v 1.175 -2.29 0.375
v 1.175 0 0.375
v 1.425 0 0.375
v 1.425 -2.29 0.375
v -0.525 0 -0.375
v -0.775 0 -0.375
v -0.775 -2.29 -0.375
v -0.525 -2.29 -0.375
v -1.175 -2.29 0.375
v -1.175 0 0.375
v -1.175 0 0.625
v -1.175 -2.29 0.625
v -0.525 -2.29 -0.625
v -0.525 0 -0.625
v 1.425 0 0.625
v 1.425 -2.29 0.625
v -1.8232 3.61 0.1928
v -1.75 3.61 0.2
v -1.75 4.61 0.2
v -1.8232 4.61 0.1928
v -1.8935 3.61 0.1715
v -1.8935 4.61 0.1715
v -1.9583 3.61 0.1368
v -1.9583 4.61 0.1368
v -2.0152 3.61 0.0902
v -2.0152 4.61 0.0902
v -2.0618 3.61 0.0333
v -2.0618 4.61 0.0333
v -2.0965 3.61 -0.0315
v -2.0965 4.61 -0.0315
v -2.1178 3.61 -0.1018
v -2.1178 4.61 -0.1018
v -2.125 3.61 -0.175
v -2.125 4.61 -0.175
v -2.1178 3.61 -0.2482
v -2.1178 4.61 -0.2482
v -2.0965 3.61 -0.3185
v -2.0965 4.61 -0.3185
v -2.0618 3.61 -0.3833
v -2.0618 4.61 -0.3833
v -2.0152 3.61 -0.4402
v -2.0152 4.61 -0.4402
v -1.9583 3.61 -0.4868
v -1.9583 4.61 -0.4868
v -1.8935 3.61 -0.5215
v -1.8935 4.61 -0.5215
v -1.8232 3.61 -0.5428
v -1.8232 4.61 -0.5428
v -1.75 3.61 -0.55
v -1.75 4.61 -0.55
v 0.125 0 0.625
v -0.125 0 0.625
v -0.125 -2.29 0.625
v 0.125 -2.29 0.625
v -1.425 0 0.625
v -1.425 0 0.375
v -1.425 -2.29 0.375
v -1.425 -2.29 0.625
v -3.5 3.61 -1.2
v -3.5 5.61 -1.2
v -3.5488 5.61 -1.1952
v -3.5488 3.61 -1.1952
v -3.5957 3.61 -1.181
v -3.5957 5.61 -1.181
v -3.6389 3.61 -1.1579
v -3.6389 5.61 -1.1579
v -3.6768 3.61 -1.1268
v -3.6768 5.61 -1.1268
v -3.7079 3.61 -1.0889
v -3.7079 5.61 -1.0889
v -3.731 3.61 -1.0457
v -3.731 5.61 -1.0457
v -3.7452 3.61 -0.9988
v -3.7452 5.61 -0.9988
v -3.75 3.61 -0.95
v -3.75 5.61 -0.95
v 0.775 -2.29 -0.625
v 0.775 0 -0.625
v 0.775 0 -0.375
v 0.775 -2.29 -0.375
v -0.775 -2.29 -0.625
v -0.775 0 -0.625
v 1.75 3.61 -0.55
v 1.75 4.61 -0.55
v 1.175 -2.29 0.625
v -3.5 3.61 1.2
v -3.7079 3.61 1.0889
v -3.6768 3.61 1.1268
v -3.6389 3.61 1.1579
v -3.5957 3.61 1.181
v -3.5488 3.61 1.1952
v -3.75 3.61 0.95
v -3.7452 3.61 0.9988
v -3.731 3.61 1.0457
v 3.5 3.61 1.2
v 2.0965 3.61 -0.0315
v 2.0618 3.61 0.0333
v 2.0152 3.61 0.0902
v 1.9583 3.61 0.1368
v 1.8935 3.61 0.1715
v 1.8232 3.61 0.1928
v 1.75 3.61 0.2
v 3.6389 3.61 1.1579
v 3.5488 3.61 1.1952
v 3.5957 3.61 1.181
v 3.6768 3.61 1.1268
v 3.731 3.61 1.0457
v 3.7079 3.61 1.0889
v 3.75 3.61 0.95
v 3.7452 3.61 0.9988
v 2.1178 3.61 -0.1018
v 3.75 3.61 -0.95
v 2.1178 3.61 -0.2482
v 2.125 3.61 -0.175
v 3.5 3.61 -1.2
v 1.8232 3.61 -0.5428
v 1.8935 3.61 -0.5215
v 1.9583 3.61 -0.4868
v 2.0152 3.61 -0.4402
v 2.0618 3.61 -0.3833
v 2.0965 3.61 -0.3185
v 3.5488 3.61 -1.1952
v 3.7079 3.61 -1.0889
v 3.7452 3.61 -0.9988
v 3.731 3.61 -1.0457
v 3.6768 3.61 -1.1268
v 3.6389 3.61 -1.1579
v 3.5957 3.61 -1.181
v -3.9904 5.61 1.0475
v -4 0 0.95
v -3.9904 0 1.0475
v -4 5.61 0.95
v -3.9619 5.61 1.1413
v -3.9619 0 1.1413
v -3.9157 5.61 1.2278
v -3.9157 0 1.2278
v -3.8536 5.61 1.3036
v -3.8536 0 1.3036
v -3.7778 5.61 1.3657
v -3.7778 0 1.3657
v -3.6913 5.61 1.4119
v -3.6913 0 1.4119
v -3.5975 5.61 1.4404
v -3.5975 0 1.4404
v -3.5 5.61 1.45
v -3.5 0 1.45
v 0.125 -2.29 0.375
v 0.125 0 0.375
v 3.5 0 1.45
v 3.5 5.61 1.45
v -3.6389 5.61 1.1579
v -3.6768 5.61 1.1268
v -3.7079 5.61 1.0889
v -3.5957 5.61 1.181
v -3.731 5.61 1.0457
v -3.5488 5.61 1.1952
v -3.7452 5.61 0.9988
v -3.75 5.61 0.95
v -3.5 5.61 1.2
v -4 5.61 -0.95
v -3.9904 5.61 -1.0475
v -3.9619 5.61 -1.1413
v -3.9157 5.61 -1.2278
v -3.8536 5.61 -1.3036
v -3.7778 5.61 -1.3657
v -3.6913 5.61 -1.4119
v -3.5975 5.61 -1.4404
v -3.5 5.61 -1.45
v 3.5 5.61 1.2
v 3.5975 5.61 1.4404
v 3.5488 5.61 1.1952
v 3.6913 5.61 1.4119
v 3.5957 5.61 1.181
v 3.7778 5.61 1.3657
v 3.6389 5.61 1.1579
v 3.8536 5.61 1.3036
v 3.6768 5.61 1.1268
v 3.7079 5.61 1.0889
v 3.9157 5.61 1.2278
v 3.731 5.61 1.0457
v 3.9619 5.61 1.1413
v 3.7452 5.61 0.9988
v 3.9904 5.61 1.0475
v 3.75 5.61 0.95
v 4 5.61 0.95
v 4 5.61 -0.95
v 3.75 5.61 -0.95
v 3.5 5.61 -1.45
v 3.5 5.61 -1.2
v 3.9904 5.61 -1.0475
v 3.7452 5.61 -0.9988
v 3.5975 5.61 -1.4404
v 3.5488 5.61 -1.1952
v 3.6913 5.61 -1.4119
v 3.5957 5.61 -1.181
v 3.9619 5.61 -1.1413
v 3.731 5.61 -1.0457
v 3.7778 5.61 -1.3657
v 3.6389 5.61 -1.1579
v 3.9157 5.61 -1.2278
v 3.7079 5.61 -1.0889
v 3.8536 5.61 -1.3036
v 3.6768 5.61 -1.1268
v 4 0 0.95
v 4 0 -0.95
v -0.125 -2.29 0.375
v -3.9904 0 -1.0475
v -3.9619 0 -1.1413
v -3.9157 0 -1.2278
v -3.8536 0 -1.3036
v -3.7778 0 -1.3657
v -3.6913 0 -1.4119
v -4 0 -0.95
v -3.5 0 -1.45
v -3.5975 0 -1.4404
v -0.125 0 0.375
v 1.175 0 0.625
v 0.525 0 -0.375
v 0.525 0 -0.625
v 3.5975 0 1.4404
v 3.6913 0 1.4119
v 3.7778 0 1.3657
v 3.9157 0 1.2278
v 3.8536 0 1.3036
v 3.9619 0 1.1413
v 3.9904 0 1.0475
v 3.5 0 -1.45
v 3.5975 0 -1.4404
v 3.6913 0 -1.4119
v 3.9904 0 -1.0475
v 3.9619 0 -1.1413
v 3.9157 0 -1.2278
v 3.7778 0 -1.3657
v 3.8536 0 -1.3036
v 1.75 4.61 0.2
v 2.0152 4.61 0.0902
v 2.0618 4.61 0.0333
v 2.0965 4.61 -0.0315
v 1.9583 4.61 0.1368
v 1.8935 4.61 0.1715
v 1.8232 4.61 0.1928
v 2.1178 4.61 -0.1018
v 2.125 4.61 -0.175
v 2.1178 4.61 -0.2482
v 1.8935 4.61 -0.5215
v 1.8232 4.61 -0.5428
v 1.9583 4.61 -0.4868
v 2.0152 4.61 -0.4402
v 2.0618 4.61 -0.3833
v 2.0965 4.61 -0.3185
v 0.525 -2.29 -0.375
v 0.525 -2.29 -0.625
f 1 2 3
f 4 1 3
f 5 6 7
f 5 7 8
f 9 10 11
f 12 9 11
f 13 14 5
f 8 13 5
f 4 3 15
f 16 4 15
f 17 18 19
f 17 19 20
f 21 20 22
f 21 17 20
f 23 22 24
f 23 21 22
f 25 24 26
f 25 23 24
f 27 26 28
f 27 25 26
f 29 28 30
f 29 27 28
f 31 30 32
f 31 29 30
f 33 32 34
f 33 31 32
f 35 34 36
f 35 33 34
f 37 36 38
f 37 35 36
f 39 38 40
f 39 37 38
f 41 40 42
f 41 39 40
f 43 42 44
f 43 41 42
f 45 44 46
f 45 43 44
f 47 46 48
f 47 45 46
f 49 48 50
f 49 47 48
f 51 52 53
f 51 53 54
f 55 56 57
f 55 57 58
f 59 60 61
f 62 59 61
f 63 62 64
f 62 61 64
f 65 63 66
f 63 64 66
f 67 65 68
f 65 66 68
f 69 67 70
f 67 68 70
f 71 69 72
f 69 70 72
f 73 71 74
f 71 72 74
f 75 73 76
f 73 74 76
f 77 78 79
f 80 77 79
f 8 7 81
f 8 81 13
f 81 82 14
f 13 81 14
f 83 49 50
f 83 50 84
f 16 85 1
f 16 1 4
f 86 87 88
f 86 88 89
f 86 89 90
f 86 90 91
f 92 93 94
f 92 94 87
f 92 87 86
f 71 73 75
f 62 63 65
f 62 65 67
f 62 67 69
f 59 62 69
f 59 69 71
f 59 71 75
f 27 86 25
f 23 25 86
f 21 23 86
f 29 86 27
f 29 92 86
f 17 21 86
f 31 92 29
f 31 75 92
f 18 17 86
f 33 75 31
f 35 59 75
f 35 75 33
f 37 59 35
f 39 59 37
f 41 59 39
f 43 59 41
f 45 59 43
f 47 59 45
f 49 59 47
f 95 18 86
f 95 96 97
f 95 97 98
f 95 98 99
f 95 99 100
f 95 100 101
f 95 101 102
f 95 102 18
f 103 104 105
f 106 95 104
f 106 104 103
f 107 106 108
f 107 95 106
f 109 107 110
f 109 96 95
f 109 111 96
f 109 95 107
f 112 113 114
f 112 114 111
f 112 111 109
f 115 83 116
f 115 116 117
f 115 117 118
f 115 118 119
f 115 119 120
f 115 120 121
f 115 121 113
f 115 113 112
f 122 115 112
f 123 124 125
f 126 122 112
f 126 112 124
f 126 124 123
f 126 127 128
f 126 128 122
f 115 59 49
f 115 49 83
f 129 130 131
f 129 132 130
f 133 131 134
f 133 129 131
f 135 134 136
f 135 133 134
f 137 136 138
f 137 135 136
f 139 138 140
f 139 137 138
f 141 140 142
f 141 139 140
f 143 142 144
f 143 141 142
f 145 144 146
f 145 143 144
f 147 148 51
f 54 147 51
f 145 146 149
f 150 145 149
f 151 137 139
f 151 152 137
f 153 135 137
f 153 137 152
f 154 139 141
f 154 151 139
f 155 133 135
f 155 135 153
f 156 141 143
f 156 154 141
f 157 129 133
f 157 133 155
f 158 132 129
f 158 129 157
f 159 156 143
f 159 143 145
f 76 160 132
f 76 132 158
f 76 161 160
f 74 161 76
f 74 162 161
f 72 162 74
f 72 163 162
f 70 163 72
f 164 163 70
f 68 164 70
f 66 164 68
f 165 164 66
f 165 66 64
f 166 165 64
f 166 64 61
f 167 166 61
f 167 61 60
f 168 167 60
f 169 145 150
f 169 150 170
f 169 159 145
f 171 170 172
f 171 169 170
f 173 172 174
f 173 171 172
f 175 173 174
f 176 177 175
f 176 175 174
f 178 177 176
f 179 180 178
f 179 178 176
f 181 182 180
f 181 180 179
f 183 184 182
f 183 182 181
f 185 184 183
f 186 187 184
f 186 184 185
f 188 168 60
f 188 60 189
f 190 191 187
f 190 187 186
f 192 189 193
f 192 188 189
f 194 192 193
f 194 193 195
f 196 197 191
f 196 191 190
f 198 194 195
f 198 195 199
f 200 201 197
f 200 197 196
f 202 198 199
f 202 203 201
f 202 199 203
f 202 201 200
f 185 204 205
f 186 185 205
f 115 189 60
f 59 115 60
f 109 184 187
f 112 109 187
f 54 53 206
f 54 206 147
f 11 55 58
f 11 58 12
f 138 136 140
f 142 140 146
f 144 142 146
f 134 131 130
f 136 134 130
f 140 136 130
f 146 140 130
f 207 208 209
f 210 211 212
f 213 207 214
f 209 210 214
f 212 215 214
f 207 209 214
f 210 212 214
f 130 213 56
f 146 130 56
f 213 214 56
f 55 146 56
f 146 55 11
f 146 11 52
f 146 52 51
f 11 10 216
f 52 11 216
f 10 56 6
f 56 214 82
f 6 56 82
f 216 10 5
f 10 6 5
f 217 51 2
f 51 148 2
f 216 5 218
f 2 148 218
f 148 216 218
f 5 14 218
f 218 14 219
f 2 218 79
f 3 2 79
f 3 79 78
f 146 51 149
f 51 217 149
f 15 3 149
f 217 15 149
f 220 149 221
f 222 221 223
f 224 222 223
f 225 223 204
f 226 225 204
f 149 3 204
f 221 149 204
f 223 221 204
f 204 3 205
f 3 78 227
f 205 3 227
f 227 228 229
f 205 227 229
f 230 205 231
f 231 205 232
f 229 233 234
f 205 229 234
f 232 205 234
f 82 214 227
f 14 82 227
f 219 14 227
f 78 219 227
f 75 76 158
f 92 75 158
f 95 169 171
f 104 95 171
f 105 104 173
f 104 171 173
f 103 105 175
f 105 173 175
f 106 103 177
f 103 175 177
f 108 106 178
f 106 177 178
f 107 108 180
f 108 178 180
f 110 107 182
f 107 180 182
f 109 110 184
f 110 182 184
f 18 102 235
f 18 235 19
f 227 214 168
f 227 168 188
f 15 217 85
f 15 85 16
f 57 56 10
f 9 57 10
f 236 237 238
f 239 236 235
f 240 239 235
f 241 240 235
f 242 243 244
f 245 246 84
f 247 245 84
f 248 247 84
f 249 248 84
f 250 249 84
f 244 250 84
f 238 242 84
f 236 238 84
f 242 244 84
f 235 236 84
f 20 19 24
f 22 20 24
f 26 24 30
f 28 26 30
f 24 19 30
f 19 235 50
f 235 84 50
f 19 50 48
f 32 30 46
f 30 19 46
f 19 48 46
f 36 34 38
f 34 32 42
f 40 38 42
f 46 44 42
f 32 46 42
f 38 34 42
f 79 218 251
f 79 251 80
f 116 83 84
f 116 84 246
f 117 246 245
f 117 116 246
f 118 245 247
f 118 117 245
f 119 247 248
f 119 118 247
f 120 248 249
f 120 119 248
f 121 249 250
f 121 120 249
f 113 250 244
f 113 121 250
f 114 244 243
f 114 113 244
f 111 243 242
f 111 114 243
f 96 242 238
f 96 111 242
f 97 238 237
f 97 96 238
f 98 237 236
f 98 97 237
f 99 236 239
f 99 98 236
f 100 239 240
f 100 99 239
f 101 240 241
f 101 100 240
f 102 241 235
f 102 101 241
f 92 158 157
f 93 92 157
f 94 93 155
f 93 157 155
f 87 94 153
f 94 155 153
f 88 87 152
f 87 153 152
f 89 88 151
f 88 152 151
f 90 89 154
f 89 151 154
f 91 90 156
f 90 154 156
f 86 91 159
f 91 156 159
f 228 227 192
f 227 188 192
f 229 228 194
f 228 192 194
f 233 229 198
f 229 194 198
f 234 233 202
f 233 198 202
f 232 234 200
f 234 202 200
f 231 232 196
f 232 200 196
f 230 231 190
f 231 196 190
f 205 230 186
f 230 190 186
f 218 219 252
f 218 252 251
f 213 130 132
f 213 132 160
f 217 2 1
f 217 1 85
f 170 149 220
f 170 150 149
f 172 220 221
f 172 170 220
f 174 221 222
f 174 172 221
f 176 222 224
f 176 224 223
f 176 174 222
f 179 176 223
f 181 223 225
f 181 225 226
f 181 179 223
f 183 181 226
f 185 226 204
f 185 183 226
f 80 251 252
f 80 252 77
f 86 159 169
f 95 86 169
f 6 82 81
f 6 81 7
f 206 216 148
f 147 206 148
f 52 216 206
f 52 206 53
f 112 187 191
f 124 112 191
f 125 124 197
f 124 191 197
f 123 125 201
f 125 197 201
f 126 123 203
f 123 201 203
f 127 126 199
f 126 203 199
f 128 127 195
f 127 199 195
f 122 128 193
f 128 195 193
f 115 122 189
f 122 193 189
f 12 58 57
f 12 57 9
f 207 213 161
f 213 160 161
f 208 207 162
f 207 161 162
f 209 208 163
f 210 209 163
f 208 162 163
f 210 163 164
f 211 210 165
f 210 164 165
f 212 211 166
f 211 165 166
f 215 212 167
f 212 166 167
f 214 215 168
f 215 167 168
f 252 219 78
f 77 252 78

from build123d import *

# Parameters (mm, degrees)
SKETCH_1_W          = 8
SKETCH_1_H          = 2.9
EXTRUDE_1_DEPTH     = 5.61
SKETCH_2_W          = 0.25
SKETCH_2_H          = 0.25
EXTRUDE_2_DEPTH     = 2.29
FILLET_2_R          = 0.5
CUT_EXTRUDE_1_DEPTH = 2
EXTRUDE_3_DEPTH     = 1


with BuildPart() as part:
    # 草图1 → 凸台-拉伸1 (new body)
    with BuildSketch(Plane(origin=(0, 0, 0), x_dir=(1, 0, 0), z_dir=(0, 1, 0))):
        Rectangle(SKETCH_1_W, SKETCH_1_H)
    extrude(amount=EXTRUDE_1_DEPTH)

    # 草图2 → 凸台-拉伸2 (add)
    with BuildSketch(Plane.XZ):
        with Locations((-1.3, 0.5)):
            Rectangle(SKETCH_2_W, SKETCH_2_H)
        with Locations((1.3, 0.5)):
            Rectangle(SKETCH_2_W, SKETCH_2_H)
        with Locations((0, 0.5)):
            Rectangle(SKETCH_2_W, SKETCH_2_H)
        with Locations((-0.65, -0.5)):
            Rectangle(SKETCH_2_W, SKETCH_2_H)
        with Locations((0.65, -0.5)):
            Rectangle(SKETCH_2_W, SKETCH_2_H)
    extrude(amount=EXTRUDE_2_DEPTH)

    # 圆角2
    fillet_2_edges = [part.edges().sort_by_distance(p)[0] for p in [
        (-4, 2.805, -1.45),
        (4, 2.805, -1.45),
        (4, 2.805, 1.45),
        (-4, 2.805, 1.45),
    ]]
    fillet(fillet_2_edges, radius=FILLET_2_R)

    # 草图3 → 切除-拉伸1 (cut)
    with BuildSketch(Plane(origin=(0, 5.61, 0), x_dir=(1, 0, 0), z_dir=(0, 1, 0))):
        with BuildLine():
            Line((3.75, -0.95), (3.75, 0.95))
            ThreePointArc((3.75, 0.95), (3.676776695, 1.126776695), (3.5, 1.2))
            Line((3.5, 1.2), (-3.5, 1.2))
            ThreePointArc((-3.5, 1.2), (-3.676776695, 1.126776695), (-3.75, 0.95))
            Line((-3.75, 0.95), (-3.75, -0.95))
            ThreePointArc((-3.75, -0.95), (-3.676776695, -1.126776695), (-3.5, -1.2))
            Line((-3.5, -1.2), (3.5, -1.2))
            ThreePointArc((3.5, -1.2), (3.676776695, -1.126776695), (3.75, -0.95))
        make_face()
    extrude(amount=-CUT_EXTRUDE_1_DEPTH, mode=Mode.SUBTRACT)

    # 草图4 → 凸台-拉伸3 (add)
    with BuildSketch(Plane(origin=(0, 3.61, 0), x_dir=(1, 0, 0), z_dir=(0, 1, 0))):
        with BuildLine():
            Line((-1.75, 0.55), (1.75, 0.55))
            ThreePointArc((1.75, 0.55), (2.125, 0.175), (1.75, -0.2))
            Line((1.75, -0.2), (-1.75, -0.2))
            ThreePointArc((-1.75, -0.2), (-2.125, 0.175), (-1.75, 0.55))
        make_face()
    extrude(amount=EXTRUDE_3_DEPTH)


solid = part.part
